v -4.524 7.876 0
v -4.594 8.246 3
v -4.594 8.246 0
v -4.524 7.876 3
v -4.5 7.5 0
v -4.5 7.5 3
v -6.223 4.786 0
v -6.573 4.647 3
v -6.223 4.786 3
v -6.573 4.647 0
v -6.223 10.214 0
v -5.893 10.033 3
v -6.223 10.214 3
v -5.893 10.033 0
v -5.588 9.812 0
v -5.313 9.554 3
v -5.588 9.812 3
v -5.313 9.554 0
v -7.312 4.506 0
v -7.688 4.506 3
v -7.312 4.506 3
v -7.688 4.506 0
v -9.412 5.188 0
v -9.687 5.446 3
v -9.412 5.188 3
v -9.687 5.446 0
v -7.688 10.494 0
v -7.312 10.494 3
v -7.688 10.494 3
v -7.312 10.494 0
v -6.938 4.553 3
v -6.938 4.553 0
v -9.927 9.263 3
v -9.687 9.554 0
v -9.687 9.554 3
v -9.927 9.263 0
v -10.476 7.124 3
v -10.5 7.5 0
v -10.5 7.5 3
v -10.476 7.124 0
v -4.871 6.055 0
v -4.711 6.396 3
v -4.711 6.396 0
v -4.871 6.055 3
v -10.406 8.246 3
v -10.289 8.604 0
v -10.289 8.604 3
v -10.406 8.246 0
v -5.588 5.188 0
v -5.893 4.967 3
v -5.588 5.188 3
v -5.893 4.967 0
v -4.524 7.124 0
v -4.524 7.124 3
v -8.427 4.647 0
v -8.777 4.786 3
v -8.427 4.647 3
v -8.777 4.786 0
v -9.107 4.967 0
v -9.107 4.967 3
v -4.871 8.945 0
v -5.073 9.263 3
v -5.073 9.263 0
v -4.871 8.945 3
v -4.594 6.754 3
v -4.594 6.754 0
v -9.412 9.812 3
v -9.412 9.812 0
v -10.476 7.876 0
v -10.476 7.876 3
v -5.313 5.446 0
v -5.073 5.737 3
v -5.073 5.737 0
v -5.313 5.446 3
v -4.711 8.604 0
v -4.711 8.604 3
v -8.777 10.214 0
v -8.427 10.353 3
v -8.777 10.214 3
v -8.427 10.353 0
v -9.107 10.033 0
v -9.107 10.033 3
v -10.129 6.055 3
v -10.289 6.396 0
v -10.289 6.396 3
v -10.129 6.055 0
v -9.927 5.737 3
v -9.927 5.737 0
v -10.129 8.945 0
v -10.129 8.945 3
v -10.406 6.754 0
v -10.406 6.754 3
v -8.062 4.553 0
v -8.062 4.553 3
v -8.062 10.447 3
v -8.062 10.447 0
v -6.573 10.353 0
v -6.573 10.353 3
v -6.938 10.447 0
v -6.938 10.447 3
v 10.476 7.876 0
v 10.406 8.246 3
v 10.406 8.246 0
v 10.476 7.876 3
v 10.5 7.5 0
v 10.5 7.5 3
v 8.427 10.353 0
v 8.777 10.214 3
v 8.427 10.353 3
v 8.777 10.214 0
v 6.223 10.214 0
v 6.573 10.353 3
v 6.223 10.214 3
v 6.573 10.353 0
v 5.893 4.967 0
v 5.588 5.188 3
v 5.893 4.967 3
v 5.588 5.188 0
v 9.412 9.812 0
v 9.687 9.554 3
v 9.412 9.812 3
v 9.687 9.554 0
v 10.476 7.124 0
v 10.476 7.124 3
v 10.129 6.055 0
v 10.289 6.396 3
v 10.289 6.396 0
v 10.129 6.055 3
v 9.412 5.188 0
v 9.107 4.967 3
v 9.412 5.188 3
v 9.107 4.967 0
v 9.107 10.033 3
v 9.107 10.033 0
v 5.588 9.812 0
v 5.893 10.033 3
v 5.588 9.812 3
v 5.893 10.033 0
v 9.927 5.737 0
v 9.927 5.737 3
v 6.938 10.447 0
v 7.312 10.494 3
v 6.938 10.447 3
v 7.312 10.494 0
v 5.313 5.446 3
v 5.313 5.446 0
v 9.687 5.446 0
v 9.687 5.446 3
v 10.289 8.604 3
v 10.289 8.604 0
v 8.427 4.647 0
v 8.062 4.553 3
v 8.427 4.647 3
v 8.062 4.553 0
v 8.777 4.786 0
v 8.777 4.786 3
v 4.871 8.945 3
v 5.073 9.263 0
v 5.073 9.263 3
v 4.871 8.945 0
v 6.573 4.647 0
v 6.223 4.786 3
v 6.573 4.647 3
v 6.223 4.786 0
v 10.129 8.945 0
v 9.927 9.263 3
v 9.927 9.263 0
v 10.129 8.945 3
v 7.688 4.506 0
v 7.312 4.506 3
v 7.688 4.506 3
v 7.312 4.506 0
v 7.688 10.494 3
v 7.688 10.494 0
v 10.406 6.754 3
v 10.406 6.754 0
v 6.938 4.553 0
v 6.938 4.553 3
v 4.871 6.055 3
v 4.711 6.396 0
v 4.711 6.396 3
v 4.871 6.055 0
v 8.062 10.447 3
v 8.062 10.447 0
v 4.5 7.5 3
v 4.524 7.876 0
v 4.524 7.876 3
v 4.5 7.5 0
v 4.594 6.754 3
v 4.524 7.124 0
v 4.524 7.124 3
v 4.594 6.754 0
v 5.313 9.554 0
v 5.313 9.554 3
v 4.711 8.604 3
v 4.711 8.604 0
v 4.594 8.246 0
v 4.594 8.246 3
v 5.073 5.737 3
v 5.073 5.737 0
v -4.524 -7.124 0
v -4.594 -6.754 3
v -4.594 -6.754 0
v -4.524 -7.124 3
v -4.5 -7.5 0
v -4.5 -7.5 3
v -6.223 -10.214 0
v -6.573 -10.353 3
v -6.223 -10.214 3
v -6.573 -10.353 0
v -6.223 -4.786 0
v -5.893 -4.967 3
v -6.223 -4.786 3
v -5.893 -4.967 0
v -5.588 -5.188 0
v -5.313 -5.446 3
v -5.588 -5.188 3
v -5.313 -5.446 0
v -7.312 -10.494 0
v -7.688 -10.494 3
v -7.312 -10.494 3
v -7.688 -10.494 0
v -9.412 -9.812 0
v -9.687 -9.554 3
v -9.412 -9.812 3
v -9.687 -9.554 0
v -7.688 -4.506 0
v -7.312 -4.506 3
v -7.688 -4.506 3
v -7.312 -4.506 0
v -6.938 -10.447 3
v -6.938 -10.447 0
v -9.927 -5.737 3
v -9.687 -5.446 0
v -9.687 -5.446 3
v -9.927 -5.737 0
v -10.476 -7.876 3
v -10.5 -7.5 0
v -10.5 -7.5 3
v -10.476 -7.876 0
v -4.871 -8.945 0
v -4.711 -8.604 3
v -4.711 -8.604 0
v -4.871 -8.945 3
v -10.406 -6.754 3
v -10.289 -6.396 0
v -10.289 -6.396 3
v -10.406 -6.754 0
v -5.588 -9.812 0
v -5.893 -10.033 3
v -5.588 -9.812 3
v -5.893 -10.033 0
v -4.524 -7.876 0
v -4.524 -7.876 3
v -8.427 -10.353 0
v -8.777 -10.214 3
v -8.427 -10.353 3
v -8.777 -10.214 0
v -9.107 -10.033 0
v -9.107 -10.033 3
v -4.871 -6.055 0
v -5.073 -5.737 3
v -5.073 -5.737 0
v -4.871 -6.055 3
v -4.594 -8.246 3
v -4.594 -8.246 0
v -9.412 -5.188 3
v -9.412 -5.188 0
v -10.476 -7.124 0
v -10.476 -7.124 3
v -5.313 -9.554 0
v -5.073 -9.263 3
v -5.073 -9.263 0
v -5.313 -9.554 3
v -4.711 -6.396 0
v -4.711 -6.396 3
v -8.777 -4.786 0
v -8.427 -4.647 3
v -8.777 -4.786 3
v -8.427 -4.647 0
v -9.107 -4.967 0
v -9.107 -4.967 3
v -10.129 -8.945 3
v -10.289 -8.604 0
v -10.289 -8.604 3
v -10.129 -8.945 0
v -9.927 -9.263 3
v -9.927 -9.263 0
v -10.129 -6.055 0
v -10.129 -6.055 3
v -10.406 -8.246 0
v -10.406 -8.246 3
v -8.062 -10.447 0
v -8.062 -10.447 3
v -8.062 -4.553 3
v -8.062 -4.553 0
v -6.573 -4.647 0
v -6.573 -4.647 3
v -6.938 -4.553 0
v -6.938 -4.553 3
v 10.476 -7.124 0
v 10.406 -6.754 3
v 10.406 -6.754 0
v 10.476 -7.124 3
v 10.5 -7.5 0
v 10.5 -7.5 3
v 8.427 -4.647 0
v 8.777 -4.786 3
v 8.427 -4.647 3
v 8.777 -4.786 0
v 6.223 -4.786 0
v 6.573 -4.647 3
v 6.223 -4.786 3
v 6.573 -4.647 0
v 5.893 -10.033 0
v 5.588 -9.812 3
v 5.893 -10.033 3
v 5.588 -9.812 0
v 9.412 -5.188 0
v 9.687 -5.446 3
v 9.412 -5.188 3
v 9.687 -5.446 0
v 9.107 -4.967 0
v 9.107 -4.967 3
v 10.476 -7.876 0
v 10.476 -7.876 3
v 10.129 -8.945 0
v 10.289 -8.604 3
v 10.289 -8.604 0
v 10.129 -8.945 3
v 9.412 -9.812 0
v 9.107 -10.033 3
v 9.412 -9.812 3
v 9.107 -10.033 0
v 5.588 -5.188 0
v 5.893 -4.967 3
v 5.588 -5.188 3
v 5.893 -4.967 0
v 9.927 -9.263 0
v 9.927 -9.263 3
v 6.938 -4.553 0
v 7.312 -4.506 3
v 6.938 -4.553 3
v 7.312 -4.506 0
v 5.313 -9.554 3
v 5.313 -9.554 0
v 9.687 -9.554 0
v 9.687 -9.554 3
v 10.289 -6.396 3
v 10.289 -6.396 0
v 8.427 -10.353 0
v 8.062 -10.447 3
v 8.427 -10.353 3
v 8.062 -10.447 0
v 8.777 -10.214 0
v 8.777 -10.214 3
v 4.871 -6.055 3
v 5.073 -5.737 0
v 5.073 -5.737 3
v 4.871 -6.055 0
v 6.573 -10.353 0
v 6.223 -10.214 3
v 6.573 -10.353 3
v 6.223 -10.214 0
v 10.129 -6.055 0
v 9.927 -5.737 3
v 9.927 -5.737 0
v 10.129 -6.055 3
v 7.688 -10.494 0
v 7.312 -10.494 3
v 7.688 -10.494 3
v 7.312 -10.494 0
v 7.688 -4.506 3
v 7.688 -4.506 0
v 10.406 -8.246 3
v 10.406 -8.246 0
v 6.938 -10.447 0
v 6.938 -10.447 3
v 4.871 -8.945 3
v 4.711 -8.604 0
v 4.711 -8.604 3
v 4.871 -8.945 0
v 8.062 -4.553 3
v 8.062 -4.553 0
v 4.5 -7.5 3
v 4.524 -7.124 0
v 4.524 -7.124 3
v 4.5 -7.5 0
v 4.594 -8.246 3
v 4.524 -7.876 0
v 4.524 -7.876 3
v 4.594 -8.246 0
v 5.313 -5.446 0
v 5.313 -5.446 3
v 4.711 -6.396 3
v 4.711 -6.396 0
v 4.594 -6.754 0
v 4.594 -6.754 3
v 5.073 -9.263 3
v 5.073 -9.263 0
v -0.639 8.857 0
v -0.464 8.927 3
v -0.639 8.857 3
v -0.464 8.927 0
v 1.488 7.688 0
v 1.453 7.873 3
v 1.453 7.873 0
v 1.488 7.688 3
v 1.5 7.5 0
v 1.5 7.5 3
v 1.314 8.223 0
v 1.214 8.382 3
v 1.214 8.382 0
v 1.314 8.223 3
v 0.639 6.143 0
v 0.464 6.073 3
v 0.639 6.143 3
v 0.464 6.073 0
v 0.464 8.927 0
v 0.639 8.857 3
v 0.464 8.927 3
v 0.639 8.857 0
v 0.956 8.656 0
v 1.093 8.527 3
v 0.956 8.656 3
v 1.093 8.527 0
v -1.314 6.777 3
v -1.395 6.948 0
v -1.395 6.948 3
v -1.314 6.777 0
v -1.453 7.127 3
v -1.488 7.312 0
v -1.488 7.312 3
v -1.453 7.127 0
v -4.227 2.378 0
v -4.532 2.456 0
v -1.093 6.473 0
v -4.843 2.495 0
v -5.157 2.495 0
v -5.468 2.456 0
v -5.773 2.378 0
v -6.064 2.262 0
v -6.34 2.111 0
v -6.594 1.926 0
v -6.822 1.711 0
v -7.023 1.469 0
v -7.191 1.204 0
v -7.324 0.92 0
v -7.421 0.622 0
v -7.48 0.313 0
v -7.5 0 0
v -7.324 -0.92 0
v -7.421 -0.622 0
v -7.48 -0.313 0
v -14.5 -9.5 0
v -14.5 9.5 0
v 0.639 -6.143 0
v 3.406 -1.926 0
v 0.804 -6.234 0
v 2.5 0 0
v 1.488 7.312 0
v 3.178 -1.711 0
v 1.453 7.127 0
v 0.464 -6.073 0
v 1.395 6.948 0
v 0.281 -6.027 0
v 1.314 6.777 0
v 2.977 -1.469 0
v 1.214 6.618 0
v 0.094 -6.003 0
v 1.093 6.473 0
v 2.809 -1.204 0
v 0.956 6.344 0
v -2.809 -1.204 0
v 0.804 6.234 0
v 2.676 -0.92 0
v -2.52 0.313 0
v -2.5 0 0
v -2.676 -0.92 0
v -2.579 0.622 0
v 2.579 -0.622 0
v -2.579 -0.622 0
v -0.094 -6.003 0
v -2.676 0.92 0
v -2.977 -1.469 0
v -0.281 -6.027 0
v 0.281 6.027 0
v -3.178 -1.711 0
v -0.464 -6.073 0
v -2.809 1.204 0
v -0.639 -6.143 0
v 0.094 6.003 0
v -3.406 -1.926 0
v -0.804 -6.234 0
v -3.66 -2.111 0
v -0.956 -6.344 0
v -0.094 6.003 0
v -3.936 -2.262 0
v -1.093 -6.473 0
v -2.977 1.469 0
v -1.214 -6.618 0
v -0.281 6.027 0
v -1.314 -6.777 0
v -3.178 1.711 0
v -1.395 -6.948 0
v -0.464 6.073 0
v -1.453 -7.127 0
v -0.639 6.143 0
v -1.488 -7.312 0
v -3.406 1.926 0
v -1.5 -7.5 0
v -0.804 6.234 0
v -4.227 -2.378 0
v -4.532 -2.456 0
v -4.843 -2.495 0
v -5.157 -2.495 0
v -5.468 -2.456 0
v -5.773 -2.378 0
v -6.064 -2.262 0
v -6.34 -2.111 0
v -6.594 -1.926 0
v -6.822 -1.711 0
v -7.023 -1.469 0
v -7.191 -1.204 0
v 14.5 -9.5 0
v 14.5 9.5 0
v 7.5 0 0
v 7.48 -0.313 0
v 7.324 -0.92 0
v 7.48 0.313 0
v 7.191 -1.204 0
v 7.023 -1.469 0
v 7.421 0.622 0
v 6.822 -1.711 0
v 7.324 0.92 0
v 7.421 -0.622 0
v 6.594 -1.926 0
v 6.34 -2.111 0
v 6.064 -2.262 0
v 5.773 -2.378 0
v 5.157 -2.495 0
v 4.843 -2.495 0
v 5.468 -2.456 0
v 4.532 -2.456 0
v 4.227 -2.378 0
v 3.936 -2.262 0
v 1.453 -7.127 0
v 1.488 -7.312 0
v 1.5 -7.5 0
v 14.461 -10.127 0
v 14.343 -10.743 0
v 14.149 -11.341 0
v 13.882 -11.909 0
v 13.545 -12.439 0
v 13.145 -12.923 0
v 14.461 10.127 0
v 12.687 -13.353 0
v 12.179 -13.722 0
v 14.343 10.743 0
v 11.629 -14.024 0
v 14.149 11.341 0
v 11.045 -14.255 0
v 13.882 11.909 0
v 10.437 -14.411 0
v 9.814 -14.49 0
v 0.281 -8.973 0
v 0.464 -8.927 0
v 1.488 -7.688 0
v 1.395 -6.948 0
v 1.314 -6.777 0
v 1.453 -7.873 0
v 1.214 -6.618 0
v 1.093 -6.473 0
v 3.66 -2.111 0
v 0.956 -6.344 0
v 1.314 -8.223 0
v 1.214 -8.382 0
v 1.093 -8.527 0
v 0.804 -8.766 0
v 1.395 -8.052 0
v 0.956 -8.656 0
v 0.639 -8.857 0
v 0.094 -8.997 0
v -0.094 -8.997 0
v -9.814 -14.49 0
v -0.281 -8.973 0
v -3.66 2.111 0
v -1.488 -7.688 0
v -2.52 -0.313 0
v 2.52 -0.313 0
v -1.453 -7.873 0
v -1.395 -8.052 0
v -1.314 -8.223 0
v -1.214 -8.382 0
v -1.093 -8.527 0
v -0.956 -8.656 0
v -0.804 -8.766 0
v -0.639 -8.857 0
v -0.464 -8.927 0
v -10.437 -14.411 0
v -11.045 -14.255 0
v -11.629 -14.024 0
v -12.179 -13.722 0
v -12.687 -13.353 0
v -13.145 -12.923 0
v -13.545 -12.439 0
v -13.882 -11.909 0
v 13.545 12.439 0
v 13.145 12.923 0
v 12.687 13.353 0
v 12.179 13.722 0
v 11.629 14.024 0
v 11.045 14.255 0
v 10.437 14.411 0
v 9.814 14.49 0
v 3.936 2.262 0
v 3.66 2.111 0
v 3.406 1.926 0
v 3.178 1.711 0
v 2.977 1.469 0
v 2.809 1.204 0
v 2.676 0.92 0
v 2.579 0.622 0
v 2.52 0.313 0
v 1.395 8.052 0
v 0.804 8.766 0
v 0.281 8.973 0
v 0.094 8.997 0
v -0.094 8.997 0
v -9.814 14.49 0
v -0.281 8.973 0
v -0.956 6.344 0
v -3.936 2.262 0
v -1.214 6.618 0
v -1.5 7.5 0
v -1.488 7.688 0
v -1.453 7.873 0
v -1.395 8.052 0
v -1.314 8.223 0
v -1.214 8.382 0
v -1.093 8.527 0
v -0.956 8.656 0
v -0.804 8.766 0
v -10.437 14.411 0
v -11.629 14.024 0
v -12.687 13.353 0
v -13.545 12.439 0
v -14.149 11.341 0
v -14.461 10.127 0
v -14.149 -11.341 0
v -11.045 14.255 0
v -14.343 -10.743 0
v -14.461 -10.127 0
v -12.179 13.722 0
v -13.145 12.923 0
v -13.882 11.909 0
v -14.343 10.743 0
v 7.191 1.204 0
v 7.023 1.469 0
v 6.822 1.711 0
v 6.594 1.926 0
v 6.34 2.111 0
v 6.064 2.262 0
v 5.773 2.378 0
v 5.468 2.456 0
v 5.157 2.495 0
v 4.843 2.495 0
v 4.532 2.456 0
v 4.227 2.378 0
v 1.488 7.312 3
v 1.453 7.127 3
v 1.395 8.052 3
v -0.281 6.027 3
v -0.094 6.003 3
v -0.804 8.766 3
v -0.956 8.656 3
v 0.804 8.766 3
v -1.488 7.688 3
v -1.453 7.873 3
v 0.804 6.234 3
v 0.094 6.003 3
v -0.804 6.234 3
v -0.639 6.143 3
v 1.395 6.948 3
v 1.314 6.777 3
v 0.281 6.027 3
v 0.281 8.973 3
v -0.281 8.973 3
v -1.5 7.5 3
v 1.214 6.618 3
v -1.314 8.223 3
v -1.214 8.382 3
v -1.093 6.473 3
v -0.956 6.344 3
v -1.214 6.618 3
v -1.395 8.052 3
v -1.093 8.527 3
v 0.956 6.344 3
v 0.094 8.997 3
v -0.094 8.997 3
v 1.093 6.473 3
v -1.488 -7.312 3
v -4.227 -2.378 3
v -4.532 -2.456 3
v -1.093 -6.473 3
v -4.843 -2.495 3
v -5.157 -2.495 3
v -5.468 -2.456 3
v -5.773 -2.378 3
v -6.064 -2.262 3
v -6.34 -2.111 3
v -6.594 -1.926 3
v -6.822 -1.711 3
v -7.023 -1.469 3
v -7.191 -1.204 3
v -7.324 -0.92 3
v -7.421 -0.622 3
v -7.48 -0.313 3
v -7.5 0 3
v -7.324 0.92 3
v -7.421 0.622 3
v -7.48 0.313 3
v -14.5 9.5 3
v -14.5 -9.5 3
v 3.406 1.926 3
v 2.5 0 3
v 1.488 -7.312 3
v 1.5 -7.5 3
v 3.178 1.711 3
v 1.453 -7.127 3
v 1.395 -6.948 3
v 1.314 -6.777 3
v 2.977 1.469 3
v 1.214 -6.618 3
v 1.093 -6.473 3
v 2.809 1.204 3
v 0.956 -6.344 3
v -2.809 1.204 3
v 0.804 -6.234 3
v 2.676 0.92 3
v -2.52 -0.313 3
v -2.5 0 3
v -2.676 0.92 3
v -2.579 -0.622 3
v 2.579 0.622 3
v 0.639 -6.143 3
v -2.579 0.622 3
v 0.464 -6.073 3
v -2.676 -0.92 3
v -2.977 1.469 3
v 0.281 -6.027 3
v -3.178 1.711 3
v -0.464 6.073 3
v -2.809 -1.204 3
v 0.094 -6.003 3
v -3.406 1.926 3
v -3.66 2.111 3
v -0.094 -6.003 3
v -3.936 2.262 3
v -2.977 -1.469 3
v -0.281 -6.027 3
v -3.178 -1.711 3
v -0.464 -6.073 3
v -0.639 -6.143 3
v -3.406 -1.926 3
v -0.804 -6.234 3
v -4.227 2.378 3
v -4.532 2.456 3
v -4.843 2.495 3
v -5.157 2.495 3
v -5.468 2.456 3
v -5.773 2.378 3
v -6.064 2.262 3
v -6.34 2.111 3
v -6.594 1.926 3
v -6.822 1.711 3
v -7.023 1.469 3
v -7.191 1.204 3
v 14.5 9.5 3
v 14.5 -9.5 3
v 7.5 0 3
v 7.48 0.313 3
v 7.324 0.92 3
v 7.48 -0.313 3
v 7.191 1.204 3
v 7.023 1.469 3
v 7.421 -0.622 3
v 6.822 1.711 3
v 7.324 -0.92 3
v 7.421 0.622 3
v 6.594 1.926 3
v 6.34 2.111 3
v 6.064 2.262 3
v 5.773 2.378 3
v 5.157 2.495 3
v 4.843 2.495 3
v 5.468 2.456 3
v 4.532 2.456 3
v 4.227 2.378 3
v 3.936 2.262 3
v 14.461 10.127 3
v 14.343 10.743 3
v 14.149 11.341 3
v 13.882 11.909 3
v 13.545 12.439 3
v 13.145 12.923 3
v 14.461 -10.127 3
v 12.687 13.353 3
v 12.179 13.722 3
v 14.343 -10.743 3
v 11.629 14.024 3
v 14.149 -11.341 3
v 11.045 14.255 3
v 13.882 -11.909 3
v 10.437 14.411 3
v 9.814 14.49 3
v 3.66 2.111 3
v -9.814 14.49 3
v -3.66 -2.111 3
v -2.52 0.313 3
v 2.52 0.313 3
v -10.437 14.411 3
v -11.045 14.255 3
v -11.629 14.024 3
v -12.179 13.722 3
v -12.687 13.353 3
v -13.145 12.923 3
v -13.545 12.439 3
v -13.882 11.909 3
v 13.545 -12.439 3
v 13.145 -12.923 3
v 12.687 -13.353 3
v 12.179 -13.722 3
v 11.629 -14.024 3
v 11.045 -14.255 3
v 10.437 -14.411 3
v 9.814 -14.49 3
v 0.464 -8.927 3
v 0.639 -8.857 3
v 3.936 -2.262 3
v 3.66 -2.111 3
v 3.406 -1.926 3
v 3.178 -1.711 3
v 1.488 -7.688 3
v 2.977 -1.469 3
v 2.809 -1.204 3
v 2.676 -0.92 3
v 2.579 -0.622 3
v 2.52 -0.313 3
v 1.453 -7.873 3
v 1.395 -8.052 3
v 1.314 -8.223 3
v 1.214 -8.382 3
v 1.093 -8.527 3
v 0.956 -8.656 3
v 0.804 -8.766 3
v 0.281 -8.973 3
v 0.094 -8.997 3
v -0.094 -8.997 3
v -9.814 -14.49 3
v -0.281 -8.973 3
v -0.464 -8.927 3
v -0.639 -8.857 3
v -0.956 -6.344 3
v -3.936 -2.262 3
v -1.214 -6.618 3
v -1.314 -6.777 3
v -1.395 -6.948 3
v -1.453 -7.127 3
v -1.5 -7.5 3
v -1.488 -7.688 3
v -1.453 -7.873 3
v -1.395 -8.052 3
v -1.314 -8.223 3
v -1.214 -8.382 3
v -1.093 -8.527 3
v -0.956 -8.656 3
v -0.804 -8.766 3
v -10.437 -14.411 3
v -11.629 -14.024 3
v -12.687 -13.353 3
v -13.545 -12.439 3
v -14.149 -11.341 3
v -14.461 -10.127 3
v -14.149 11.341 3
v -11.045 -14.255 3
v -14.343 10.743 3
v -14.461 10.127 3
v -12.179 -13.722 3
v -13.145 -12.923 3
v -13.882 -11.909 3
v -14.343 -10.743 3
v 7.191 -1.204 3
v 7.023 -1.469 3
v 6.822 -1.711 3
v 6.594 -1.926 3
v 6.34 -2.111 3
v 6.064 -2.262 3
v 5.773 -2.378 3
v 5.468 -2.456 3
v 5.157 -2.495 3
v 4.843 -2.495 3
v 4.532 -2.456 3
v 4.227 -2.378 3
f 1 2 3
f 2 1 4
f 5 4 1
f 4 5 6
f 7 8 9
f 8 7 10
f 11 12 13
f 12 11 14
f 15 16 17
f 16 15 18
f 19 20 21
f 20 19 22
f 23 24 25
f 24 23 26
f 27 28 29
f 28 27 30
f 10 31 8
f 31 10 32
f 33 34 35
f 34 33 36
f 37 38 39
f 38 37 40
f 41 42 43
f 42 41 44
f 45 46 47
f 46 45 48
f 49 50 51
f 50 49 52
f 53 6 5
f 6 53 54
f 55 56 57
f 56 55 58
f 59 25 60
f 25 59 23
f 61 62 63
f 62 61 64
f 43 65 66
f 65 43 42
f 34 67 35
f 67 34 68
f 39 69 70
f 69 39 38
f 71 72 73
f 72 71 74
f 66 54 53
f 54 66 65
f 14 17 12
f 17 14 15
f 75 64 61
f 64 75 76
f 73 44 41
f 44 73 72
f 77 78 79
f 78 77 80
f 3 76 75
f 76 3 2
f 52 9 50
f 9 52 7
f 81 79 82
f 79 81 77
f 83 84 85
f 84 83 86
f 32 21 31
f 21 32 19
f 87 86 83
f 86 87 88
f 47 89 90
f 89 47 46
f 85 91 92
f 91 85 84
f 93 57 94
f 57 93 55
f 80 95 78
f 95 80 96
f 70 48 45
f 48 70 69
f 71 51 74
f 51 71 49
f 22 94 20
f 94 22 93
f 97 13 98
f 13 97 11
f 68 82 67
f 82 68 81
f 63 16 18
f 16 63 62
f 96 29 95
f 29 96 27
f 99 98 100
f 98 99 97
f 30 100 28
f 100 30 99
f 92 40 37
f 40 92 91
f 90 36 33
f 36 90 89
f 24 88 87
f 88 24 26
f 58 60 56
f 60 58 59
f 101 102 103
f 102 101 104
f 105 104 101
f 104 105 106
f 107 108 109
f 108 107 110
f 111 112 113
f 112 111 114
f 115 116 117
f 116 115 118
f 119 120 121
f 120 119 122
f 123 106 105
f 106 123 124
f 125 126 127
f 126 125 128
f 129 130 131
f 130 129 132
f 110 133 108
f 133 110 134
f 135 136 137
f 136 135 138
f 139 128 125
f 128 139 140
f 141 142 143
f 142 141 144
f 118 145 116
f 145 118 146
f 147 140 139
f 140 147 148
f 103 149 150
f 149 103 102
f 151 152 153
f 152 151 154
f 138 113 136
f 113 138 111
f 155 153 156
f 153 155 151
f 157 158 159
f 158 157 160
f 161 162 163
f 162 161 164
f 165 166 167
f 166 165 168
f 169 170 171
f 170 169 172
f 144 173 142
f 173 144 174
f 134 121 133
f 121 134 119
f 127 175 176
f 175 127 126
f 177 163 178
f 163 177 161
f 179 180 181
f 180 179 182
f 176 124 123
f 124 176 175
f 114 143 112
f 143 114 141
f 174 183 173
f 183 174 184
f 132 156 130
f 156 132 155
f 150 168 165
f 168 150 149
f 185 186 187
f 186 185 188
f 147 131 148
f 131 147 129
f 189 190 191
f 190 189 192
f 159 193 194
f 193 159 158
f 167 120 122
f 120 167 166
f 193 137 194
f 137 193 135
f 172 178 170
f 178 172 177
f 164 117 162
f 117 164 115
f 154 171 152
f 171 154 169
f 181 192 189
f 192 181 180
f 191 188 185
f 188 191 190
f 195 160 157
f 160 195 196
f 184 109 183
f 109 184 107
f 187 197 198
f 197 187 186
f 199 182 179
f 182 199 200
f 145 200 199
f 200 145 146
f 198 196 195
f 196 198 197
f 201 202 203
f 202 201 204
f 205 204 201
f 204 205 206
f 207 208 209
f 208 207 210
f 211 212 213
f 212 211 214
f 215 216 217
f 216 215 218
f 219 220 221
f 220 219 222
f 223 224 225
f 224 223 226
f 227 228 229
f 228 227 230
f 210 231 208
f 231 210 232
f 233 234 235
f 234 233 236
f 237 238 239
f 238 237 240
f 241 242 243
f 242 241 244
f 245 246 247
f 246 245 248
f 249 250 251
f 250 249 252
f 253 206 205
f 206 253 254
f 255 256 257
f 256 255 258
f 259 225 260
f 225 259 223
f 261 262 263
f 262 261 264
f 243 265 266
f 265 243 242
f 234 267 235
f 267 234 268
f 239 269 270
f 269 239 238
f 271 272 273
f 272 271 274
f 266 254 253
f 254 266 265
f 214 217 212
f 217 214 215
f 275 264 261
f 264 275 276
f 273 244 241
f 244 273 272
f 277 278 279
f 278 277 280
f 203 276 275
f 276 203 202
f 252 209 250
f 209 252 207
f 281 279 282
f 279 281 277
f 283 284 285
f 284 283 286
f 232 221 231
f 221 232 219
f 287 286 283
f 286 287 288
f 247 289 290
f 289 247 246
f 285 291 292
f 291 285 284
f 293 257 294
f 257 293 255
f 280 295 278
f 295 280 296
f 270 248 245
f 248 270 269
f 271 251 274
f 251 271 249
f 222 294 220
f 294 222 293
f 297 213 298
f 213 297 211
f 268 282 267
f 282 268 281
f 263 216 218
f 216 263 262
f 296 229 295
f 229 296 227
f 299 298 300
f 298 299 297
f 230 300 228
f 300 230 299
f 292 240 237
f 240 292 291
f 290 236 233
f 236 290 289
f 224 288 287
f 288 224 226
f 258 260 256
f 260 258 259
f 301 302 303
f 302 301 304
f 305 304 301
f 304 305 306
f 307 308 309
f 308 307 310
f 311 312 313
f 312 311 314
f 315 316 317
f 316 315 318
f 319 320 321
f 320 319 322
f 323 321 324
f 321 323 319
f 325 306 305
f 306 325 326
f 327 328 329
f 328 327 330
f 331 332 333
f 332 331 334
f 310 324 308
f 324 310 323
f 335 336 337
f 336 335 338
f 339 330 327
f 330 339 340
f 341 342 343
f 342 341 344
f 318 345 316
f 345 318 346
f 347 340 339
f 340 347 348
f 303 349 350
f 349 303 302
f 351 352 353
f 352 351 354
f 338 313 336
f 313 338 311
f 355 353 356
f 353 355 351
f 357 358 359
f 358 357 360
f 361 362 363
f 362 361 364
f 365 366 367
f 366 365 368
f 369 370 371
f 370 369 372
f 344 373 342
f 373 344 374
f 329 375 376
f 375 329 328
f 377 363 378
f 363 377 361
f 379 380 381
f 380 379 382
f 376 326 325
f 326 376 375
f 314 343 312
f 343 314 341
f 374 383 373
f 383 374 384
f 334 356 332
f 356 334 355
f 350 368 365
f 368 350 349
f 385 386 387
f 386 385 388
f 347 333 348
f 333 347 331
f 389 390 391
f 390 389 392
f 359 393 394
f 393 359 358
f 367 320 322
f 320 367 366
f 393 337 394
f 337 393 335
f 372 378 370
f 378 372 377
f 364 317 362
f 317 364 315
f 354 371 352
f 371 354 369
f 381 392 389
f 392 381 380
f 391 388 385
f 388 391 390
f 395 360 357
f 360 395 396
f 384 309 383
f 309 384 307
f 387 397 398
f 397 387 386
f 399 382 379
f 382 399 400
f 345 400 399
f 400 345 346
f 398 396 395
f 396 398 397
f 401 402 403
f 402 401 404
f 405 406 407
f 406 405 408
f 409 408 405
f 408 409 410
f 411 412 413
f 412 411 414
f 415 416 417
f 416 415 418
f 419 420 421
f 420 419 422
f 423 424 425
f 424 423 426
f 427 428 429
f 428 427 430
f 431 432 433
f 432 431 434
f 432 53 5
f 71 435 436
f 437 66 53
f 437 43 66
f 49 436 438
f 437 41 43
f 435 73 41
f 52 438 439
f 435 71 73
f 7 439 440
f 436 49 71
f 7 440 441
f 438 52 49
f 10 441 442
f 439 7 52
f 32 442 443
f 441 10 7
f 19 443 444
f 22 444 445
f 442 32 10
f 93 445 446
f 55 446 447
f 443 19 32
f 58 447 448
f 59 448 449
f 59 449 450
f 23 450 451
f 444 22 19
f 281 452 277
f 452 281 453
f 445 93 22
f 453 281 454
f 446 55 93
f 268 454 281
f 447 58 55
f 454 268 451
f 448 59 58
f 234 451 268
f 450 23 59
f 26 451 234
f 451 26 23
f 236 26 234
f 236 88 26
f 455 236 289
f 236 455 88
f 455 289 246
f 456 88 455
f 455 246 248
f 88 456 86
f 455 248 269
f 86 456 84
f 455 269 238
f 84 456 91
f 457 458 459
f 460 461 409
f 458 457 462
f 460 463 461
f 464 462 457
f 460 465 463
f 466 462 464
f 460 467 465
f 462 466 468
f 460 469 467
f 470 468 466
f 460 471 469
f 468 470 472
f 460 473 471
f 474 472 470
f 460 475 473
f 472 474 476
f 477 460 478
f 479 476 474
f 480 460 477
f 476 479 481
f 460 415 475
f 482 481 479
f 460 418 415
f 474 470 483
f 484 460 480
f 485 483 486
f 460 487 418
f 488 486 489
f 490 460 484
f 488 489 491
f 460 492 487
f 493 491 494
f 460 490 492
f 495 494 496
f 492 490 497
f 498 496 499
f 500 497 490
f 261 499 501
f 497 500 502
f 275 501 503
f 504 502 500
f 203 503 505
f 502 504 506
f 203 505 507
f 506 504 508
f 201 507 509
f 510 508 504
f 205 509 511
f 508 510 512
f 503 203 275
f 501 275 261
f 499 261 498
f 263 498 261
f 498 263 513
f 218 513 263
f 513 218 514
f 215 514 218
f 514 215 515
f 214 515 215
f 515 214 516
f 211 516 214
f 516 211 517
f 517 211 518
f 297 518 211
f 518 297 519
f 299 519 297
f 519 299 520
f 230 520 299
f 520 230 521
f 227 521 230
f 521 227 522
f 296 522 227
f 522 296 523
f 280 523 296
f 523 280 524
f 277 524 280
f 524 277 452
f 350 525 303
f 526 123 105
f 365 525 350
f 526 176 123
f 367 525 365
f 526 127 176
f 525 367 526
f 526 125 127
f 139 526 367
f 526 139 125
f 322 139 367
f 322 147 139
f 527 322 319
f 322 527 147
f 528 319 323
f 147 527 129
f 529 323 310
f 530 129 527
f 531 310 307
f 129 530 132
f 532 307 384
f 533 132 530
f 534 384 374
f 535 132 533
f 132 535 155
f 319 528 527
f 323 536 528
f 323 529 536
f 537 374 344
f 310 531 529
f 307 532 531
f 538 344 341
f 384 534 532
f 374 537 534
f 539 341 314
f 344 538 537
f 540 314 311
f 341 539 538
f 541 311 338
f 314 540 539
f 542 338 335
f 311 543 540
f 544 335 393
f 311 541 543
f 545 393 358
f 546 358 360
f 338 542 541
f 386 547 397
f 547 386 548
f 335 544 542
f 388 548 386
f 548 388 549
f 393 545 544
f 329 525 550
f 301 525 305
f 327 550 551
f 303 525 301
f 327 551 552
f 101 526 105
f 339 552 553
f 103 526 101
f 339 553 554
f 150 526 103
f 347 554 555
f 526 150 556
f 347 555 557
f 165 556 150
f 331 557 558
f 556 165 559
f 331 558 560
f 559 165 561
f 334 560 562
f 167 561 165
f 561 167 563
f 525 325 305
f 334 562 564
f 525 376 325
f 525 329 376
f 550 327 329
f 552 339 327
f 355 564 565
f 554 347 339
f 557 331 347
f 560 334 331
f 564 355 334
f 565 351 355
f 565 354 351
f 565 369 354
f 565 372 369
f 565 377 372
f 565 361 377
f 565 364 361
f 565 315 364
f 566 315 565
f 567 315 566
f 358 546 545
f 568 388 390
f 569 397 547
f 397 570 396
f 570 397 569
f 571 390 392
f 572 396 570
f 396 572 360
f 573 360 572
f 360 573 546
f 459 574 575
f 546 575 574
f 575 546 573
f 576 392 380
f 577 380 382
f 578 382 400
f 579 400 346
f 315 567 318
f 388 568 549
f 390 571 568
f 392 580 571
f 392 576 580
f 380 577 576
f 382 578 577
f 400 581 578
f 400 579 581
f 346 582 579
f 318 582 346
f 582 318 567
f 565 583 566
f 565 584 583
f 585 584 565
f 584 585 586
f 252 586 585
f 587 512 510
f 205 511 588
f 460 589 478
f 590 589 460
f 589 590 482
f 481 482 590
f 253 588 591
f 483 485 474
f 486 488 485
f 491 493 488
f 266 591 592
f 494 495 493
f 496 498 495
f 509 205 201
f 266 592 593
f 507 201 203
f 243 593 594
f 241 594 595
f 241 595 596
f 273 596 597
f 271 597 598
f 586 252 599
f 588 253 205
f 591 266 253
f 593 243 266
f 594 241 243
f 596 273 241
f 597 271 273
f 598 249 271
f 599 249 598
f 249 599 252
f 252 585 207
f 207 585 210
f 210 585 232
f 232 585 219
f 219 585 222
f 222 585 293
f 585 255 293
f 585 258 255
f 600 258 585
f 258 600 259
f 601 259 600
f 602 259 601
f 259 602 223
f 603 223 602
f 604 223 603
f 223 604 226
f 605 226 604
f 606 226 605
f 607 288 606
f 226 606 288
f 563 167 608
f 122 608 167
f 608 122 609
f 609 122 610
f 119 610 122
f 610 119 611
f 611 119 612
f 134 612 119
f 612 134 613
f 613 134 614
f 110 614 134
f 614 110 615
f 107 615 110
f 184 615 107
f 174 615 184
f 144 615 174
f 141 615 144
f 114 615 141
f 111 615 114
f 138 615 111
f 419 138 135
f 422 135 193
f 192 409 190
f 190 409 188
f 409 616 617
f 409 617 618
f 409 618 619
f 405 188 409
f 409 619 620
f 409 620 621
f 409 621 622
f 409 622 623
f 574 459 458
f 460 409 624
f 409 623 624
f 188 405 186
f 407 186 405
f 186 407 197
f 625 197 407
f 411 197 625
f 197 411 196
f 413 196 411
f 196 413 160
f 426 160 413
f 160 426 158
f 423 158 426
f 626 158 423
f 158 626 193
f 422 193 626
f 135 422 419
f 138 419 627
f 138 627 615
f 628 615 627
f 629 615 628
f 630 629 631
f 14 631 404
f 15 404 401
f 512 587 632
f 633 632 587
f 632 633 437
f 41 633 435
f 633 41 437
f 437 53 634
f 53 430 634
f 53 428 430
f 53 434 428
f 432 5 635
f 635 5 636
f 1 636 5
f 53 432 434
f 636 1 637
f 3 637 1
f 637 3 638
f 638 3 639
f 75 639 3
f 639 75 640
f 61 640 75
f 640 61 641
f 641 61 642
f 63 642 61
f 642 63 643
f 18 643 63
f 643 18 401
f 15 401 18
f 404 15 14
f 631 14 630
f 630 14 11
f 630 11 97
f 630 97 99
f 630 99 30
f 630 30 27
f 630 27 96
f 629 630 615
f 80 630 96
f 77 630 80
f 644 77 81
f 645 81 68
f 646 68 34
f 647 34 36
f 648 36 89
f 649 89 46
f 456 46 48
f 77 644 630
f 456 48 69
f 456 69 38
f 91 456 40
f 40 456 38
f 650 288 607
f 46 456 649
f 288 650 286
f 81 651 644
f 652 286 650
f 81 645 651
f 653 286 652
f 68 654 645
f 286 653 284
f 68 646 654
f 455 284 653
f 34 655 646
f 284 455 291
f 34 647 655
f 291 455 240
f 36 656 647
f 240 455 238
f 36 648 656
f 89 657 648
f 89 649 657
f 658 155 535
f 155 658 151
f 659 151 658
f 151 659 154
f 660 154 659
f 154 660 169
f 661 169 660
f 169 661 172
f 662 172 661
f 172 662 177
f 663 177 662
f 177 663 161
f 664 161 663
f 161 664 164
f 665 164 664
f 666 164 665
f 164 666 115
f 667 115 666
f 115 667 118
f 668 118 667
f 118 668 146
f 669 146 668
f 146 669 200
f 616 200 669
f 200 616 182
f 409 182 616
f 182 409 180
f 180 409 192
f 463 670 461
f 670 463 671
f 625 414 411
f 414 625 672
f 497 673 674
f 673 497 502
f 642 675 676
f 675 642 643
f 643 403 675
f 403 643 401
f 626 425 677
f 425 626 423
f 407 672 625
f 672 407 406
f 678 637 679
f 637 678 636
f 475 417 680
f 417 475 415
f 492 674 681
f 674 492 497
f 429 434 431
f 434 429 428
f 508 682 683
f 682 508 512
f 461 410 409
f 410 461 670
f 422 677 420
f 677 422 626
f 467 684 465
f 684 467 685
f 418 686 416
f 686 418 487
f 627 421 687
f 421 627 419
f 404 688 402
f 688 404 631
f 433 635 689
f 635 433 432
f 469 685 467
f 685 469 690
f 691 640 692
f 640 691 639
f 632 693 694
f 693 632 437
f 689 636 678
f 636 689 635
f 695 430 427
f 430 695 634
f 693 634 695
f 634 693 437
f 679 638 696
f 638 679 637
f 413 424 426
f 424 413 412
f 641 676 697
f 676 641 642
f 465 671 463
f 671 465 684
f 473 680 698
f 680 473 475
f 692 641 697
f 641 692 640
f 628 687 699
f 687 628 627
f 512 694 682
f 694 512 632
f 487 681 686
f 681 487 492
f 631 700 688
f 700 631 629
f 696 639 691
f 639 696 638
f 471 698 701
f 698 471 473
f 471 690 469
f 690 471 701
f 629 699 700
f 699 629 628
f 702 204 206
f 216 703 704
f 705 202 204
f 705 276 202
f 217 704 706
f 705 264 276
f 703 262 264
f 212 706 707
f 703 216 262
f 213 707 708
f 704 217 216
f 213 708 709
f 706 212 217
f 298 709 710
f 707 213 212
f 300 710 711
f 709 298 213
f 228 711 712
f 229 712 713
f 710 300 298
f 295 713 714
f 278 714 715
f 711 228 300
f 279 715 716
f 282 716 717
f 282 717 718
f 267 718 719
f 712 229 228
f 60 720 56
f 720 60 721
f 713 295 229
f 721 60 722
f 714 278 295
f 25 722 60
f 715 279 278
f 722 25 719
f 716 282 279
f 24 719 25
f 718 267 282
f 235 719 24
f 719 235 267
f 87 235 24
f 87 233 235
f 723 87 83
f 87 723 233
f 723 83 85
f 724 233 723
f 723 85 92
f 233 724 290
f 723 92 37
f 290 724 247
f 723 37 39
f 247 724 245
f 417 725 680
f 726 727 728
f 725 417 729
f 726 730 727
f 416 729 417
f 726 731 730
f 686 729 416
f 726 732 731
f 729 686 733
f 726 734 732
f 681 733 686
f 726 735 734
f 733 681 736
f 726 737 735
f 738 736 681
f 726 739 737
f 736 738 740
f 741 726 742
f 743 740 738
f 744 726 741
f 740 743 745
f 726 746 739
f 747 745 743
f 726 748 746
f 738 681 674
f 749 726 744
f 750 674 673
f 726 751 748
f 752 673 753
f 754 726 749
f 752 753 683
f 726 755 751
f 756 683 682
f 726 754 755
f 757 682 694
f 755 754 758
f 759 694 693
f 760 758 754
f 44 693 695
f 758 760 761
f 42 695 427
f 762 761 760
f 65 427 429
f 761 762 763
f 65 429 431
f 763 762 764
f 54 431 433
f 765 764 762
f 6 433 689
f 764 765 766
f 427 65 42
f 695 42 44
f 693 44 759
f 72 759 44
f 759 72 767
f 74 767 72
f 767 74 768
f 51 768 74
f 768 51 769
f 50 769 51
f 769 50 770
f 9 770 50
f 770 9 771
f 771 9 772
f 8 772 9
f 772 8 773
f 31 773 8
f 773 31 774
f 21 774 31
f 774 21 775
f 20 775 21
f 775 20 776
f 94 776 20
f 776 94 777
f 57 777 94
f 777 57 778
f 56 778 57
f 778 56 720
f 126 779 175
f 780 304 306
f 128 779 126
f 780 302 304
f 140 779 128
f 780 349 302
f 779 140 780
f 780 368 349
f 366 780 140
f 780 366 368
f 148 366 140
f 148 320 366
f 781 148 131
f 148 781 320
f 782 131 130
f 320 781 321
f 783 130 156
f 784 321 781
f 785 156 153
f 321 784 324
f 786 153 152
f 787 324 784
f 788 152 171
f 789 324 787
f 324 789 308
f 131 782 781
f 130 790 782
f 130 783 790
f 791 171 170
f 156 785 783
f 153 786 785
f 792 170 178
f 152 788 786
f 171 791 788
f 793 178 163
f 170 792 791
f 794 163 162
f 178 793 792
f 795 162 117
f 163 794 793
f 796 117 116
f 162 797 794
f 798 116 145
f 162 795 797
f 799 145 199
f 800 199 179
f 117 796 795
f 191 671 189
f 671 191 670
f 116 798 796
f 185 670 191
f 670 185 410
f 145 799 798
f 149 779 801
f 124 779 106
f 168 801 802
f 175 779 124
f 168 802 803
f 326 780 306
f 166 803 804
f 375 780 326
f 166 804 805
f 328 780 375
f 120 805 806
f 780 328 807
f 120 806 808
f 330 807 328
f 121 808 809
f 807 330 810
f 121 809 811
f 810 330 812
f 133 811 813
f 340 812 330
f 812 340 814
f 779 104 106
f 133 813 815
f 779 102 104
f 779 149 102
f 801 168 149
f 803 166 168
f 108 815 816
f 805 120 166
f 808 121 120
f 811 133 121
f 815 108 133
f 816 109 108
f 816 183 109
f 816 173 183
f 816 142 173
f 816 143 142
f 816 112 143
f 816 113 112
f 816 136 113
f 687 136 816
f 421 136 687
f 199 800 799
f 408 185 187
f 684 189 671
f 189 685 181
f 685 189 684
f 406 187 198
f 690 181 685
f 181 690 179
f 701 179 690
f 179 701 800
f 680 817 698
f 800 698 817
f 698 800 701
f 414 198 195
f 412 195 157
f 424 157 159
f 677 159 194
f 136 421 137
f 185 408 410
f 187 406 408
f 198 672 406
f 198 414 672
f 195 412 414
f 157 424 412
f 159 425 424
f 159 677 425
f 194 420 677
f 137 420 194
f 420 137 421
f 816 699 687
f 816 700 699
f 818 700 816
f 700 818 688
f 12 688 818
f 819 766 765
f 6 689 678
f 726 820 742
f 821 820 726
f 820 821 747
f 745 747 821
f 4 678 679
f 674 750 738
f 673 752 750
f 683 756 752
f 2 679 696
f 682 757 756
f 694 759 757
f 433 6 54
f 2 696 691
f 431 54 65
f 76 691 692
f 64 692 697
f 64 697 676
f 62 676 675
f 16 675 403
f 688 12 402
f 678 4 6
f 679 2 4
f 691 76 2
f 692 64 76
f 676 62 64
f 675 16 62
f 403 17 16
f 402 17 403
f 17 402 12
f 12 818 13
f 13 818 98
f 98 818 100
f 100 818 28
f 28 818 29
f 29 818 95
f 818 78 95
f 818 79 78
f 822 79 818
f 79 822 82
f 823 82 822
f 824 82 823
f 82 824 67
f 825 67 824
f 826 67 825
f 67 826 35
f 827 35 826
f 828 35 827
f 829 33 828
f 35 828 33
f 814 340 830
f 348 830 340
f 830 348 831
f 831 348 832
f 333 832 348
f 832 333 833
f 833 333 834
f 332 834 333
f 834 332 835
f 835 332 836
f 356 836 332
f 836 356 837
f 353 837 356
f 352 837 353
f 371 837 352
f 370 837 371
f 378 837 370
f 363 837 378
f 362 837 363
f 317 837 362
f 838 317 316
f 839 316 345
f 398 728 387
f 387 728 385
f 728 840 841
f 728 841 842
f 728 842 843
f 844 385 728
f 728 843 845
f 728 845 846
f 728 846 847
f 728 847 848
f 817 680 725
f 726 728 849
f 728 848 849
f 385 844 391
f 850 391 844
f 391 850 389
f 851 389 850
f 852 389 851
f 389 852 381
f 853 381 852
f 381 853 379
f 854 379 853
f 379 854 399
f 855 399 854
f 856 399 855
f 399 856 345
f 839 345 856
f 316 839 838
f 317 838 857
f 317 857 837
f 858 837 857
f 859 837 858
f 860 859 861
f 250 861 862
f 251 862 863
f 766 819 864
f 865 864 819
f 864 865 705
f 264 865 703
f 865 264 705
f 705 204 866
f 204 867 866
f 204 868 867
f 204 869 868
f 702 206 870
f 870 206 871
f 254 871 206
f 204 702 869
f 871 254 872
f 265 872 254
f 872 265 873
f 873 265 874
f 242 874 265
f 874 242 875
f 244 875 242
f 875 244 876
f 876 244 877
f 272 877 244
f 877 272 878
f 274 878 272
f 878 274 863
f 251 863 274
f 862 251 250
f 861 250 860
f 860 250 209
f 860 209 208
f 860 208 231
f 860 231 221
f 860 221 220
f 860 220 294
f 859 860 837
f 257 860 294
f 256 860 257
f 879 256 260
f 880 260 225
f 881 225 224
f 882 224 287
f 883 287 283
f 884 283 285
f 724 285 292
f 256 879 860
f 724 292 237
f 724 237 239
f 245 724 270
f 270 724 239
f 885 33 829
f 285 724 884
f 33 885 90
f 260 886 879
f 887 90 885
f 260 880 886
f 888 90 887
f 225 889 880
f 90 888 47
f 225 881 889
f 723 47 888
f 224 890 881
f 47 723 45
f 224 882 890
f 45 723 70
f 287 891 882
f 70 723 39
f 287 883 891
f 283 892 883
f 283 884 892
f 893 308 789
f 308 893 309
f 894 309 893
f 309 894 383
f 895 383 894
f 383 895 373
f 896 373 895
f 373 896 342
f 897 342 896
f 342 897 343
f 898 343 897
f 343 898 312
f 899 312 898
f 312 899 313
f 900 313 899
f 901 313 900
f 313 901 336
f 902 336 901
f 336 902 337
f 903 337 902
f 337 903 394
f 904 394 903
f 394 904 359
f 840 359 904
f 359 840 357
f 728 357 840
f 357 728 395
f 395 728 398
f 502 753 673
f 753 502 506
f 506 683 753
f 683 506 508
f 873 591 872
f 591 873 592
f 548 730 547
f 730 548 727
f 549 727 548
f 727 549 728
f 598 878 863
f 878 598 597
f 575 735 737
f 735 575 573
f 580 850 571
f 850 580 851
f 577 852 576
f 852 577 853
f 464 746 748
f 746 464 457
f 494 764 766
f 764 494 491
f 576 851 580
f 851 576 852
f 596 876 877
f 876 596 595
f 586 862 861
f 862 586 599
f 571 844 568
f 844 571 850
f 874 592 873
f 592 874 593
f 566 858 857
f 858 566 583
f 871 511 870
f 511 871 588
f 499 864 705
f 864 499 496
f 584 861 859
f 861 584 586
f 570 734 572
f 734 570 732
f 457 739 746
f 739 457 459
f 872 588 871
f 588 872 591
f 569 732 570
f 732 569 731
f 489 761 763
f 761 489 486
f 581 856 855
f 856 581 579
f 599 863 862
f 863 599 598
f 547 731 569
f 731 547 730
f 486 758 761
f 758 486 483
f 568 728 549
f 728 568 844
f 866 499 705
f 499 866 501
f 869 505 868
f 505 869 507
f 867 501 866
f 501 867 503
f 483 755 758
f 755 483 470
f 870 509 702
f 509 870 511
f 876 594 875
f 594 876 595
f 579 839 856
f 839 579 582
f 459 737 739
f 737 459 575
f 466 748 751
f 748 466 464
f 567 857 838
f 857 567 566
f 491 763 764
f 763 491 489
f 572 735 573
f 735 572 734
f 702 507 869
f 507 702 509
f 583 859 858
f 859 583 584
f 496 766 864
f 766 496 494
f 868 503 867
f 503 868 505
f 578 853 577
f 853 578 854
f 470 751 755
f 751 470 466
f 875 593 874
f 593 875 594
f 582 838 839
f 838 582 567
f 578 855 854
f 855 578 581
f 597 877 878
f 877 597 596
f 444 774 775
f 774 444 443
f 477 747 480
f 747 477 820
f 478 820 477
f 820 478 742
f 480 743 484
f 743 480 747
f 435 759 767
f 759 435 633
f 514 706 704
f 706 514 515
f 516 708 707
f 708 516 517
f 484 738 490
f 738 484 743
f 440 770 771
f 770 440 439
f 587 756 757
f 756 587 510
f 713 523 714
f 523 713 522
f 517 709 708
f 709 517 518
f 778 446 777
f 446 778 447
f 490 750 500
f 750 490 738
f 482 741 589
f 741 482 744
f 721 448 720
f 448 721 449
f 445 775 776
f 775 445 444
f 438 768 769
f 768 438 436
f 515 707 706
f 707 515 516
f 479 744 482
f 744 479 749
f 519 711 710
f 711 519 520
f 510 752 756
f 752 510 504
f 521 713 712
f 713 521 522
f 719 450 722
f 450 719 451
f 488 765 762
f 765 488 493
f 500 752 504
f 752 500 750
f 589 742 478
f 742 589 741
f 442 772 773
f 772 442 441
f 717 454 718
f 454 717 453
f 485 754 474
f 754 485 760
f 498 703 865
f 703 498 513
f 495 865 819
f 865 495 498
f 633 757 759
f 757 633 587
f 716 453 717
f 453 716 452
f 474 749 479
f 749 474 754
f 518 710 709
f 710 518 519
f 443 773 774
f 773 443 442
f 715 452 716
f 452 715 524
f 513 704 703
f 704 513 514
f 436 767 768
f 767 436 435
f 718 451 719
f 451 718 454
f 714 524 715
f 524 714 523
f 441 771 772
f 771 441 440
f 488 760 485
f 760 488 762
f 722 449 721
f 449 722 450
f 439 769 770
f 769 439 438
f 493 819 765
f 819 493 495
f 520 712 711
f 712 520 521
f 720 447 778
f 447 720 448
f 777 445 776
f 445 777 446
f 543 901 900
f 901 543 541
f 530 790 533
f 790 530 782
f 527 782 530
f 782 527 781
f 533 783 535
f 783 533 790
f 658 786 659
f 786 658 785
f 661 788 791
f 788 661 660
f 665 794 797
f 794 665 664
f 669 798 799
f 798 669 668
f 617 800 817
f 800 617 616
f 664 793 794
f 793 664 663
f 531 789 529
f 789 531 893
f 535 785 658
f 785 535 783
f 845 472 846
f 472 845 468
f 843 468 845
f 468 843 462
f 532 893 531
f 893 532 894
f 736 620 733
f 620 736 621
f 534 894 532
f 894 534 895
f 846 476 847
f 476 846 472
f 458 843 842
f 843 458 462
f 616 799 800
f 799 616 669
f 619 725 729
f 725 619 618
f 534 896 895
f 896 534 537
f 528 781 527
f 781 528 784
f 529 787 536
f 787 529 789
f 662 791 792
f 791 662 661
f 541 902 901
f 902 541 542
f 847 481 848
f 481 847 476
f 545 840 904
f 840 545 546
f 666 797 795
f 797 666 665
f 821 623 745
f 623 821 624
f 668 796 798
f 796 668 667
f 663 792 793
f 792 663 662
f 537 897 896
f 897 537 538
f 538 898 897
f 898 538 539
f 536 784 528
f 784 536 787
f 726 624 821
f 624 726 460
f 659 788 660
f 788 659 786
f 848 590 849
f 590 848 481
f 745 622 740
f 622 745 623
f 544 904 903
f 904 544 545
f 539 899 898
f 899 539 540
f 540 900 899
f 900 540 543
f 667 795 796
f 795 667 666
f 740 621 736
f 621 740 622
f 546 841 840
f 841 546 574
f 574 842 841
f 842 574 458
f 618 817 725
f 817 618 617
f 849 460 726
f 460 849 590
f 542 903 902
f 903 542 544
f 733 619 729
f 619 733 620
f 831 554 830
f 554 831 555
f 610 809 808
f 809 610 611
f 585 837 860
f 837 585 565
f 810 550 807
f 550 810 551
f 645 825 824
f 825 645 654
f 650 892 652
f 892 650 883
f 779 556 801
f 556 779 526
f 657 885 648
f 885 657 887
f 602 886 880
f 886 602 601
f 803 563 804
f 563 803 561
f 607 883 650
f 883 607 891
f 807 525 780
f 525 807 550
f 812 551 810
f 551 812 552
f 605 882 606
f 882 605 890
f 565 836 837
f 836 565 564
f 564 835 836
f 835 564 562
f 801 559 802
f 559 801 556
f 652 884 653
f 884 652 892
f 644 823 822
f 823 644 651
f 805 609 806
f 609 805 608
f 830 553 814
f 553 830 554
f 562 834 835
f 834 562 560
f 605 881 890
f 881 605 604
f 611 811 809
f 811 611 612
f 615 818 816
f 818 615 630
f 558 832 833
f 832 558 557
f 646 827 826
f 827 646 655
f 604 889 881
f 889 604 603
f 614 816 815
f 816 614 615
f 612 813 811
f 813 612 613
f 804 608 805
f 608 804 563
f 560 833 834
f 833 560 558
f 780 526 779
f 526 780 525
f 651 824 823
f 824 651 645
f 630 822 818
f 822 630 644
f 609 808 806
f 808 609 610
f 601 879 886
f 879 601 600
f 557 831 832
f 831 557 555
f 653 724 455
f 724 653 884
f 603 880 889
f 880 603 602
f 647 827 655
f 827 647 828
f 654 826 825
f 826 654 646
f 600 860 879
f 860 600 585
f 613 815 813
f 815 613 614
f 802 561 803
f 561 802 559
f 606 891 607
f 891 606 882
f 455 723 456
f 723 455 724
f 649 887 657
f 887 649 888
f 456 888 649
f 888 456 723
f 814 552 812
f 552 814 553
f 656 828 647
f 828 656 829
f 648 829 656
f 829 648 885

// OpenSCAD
$fn = 50;


difference() {
	union() {
		hull() {
			translate(v = [-9.5000000000, 9.5000000000, 0]) {
				cylinder(h = 3, r = 5);
			}
			translate(v = [9.5000000000, 9.5000000000, 0]) {
				cylinder(h = 3, r = 5);
			}
			translate(v = [-9.5000000000, -9.5000000000, 0]) {
				cylinder(h = 3, r = 5);
			}
			translate(v = [9.5000000000, -9.5000000000, 0]) {
				cylinder(h = 3, r = 5);
			}
		}
	}
	union() {
		#translate(v = [-7.5000000000, 7.5000000000, 0]) {
			cylinder(h = 3, r = 3.0000000000);
		}
		#translate(v = [7.5000000000, 7.5000000000, 0]) {
			cylinder(h = 3, r = 3.0000000000);
		}
		#translate(v = [-7.5000000000, -7.5000000000, 0]) {
			cylinder(h = 3, r = 3.0000000000);
		}
		#translate(v = [7.5000000000, -7.5000000000, 0]) {
			cylinder(h = 3, r = 3.0000000000);
		}
		#translate(v = [-7.5000000000, -7.5000000000, -100.0000000000]) {
			cylinder(h = 200, r = 3.0000000000);
		}
		#translate(v = [-7.5000000000, 7.5000000000, -100.0000000000]) {
			cylinder(h = 200, r = 3.0000000000);
		}
		#translate(v = [7.5000000000, -7.5000000000, -100.0000000000]) {
			cylinder(h = 200, r = 3.0000000000);
		}
		#translate(v = [7.5000000000, 7.5000000000, -100.0000000000]) {
			cylinder(h = 200, r = 3.0000000000);
		}
		#translate(v = [-7.5000000000, 7.5000000000, 0]) {
			cylinder(h = 3, r = 1.5000000000);
		}
		#translate(v = [0.0000000000, 7.5000000000, 0]) {
			cylinder(h = 3, r = 1.5000000000);
		}
		#translate(v = [7.5000000000, 7.5000000000, 0]) {
			cylinder(h = 3, r = 1.5000000000);
		}
		#translate(v = [-7.5000000000, -7.5000000000, 0]) {
			cylinder(h = 3, r = 1.5000000000);
		}
		#translate(v = [0.0000000000, -7.5000000000, 0]) {
			cylinder(h = 3, r = 1.5000000000);
		}
		#translate(v = [7.5000000000, -7.5000000000, 0]) {
			cylinder(h = 3, r = 1.5000000000);
		}
		#translate(v = [-7.5000000000, 7.5000000000, 0]) {
			cylinder(h = 3, r = 1.5000000000);
		}
		#translate(v = [0.0000000000, 7.5000000000, 0]) {
			cylinder(h = 3, r = 1.5000000000);
		}
		#translate(v = [7.5000000000, 7.5000000000, 0]) {
			cylinder(h = 3, r = 1.5000000000);
		}
		#translate(v = [-7.5000000000, -7.5000000000, 0]) {
			cylinder(h = 3, r = 1.5000000000);
		}
		#translate(v = [0.0000000000, -7.5000000000, 0]) {
			cylinder(h = 3, r = 1.5000000000);
		}
		#translate(v = [7.5000000000, -7.5000000000, 0]) {
			cylinder(h = 3, r = 1.5000000000);
		}
		#translate(v = [-7.5000000000, 7.5000000000, 0]) {
			cylinder(h = 3, r = 1.5000000000);
		}
		#translate(v = [0.0000000000, 7.5000000000, 0]) {
			cylinder(h = 3, r = 1.5000000000);
		}
		#translate(v = [7.5000000000, 7.5000000000, 0]) {
			cylinder(h = 3, r = 1.5000000000);
		}
		#translate(v = [-7.5000000000, -7.5000000000, 0]) {
			cylinder(h = 3, r = 1.5000000000);
		}
		#translate(v = [0.0000000000, -7.5000000000, 0]) {
			cylinder(h = 3, r = 1.5000000000);
		}
		#translate(v = [7.5000000000, -7.5000000000, 0]) {
			cylinder(h = 3, r = 1.5000000000);
		}
		#translate(v = [-5.0000000000, 0, 0]) {
			cylinder(h = 3, r = 2.5000000000);
		}
		#translate(v = [5.0000000000, 0, 0]) {
			cylinder(h = 3, r = 2.5000000000);
		}
	}
}
